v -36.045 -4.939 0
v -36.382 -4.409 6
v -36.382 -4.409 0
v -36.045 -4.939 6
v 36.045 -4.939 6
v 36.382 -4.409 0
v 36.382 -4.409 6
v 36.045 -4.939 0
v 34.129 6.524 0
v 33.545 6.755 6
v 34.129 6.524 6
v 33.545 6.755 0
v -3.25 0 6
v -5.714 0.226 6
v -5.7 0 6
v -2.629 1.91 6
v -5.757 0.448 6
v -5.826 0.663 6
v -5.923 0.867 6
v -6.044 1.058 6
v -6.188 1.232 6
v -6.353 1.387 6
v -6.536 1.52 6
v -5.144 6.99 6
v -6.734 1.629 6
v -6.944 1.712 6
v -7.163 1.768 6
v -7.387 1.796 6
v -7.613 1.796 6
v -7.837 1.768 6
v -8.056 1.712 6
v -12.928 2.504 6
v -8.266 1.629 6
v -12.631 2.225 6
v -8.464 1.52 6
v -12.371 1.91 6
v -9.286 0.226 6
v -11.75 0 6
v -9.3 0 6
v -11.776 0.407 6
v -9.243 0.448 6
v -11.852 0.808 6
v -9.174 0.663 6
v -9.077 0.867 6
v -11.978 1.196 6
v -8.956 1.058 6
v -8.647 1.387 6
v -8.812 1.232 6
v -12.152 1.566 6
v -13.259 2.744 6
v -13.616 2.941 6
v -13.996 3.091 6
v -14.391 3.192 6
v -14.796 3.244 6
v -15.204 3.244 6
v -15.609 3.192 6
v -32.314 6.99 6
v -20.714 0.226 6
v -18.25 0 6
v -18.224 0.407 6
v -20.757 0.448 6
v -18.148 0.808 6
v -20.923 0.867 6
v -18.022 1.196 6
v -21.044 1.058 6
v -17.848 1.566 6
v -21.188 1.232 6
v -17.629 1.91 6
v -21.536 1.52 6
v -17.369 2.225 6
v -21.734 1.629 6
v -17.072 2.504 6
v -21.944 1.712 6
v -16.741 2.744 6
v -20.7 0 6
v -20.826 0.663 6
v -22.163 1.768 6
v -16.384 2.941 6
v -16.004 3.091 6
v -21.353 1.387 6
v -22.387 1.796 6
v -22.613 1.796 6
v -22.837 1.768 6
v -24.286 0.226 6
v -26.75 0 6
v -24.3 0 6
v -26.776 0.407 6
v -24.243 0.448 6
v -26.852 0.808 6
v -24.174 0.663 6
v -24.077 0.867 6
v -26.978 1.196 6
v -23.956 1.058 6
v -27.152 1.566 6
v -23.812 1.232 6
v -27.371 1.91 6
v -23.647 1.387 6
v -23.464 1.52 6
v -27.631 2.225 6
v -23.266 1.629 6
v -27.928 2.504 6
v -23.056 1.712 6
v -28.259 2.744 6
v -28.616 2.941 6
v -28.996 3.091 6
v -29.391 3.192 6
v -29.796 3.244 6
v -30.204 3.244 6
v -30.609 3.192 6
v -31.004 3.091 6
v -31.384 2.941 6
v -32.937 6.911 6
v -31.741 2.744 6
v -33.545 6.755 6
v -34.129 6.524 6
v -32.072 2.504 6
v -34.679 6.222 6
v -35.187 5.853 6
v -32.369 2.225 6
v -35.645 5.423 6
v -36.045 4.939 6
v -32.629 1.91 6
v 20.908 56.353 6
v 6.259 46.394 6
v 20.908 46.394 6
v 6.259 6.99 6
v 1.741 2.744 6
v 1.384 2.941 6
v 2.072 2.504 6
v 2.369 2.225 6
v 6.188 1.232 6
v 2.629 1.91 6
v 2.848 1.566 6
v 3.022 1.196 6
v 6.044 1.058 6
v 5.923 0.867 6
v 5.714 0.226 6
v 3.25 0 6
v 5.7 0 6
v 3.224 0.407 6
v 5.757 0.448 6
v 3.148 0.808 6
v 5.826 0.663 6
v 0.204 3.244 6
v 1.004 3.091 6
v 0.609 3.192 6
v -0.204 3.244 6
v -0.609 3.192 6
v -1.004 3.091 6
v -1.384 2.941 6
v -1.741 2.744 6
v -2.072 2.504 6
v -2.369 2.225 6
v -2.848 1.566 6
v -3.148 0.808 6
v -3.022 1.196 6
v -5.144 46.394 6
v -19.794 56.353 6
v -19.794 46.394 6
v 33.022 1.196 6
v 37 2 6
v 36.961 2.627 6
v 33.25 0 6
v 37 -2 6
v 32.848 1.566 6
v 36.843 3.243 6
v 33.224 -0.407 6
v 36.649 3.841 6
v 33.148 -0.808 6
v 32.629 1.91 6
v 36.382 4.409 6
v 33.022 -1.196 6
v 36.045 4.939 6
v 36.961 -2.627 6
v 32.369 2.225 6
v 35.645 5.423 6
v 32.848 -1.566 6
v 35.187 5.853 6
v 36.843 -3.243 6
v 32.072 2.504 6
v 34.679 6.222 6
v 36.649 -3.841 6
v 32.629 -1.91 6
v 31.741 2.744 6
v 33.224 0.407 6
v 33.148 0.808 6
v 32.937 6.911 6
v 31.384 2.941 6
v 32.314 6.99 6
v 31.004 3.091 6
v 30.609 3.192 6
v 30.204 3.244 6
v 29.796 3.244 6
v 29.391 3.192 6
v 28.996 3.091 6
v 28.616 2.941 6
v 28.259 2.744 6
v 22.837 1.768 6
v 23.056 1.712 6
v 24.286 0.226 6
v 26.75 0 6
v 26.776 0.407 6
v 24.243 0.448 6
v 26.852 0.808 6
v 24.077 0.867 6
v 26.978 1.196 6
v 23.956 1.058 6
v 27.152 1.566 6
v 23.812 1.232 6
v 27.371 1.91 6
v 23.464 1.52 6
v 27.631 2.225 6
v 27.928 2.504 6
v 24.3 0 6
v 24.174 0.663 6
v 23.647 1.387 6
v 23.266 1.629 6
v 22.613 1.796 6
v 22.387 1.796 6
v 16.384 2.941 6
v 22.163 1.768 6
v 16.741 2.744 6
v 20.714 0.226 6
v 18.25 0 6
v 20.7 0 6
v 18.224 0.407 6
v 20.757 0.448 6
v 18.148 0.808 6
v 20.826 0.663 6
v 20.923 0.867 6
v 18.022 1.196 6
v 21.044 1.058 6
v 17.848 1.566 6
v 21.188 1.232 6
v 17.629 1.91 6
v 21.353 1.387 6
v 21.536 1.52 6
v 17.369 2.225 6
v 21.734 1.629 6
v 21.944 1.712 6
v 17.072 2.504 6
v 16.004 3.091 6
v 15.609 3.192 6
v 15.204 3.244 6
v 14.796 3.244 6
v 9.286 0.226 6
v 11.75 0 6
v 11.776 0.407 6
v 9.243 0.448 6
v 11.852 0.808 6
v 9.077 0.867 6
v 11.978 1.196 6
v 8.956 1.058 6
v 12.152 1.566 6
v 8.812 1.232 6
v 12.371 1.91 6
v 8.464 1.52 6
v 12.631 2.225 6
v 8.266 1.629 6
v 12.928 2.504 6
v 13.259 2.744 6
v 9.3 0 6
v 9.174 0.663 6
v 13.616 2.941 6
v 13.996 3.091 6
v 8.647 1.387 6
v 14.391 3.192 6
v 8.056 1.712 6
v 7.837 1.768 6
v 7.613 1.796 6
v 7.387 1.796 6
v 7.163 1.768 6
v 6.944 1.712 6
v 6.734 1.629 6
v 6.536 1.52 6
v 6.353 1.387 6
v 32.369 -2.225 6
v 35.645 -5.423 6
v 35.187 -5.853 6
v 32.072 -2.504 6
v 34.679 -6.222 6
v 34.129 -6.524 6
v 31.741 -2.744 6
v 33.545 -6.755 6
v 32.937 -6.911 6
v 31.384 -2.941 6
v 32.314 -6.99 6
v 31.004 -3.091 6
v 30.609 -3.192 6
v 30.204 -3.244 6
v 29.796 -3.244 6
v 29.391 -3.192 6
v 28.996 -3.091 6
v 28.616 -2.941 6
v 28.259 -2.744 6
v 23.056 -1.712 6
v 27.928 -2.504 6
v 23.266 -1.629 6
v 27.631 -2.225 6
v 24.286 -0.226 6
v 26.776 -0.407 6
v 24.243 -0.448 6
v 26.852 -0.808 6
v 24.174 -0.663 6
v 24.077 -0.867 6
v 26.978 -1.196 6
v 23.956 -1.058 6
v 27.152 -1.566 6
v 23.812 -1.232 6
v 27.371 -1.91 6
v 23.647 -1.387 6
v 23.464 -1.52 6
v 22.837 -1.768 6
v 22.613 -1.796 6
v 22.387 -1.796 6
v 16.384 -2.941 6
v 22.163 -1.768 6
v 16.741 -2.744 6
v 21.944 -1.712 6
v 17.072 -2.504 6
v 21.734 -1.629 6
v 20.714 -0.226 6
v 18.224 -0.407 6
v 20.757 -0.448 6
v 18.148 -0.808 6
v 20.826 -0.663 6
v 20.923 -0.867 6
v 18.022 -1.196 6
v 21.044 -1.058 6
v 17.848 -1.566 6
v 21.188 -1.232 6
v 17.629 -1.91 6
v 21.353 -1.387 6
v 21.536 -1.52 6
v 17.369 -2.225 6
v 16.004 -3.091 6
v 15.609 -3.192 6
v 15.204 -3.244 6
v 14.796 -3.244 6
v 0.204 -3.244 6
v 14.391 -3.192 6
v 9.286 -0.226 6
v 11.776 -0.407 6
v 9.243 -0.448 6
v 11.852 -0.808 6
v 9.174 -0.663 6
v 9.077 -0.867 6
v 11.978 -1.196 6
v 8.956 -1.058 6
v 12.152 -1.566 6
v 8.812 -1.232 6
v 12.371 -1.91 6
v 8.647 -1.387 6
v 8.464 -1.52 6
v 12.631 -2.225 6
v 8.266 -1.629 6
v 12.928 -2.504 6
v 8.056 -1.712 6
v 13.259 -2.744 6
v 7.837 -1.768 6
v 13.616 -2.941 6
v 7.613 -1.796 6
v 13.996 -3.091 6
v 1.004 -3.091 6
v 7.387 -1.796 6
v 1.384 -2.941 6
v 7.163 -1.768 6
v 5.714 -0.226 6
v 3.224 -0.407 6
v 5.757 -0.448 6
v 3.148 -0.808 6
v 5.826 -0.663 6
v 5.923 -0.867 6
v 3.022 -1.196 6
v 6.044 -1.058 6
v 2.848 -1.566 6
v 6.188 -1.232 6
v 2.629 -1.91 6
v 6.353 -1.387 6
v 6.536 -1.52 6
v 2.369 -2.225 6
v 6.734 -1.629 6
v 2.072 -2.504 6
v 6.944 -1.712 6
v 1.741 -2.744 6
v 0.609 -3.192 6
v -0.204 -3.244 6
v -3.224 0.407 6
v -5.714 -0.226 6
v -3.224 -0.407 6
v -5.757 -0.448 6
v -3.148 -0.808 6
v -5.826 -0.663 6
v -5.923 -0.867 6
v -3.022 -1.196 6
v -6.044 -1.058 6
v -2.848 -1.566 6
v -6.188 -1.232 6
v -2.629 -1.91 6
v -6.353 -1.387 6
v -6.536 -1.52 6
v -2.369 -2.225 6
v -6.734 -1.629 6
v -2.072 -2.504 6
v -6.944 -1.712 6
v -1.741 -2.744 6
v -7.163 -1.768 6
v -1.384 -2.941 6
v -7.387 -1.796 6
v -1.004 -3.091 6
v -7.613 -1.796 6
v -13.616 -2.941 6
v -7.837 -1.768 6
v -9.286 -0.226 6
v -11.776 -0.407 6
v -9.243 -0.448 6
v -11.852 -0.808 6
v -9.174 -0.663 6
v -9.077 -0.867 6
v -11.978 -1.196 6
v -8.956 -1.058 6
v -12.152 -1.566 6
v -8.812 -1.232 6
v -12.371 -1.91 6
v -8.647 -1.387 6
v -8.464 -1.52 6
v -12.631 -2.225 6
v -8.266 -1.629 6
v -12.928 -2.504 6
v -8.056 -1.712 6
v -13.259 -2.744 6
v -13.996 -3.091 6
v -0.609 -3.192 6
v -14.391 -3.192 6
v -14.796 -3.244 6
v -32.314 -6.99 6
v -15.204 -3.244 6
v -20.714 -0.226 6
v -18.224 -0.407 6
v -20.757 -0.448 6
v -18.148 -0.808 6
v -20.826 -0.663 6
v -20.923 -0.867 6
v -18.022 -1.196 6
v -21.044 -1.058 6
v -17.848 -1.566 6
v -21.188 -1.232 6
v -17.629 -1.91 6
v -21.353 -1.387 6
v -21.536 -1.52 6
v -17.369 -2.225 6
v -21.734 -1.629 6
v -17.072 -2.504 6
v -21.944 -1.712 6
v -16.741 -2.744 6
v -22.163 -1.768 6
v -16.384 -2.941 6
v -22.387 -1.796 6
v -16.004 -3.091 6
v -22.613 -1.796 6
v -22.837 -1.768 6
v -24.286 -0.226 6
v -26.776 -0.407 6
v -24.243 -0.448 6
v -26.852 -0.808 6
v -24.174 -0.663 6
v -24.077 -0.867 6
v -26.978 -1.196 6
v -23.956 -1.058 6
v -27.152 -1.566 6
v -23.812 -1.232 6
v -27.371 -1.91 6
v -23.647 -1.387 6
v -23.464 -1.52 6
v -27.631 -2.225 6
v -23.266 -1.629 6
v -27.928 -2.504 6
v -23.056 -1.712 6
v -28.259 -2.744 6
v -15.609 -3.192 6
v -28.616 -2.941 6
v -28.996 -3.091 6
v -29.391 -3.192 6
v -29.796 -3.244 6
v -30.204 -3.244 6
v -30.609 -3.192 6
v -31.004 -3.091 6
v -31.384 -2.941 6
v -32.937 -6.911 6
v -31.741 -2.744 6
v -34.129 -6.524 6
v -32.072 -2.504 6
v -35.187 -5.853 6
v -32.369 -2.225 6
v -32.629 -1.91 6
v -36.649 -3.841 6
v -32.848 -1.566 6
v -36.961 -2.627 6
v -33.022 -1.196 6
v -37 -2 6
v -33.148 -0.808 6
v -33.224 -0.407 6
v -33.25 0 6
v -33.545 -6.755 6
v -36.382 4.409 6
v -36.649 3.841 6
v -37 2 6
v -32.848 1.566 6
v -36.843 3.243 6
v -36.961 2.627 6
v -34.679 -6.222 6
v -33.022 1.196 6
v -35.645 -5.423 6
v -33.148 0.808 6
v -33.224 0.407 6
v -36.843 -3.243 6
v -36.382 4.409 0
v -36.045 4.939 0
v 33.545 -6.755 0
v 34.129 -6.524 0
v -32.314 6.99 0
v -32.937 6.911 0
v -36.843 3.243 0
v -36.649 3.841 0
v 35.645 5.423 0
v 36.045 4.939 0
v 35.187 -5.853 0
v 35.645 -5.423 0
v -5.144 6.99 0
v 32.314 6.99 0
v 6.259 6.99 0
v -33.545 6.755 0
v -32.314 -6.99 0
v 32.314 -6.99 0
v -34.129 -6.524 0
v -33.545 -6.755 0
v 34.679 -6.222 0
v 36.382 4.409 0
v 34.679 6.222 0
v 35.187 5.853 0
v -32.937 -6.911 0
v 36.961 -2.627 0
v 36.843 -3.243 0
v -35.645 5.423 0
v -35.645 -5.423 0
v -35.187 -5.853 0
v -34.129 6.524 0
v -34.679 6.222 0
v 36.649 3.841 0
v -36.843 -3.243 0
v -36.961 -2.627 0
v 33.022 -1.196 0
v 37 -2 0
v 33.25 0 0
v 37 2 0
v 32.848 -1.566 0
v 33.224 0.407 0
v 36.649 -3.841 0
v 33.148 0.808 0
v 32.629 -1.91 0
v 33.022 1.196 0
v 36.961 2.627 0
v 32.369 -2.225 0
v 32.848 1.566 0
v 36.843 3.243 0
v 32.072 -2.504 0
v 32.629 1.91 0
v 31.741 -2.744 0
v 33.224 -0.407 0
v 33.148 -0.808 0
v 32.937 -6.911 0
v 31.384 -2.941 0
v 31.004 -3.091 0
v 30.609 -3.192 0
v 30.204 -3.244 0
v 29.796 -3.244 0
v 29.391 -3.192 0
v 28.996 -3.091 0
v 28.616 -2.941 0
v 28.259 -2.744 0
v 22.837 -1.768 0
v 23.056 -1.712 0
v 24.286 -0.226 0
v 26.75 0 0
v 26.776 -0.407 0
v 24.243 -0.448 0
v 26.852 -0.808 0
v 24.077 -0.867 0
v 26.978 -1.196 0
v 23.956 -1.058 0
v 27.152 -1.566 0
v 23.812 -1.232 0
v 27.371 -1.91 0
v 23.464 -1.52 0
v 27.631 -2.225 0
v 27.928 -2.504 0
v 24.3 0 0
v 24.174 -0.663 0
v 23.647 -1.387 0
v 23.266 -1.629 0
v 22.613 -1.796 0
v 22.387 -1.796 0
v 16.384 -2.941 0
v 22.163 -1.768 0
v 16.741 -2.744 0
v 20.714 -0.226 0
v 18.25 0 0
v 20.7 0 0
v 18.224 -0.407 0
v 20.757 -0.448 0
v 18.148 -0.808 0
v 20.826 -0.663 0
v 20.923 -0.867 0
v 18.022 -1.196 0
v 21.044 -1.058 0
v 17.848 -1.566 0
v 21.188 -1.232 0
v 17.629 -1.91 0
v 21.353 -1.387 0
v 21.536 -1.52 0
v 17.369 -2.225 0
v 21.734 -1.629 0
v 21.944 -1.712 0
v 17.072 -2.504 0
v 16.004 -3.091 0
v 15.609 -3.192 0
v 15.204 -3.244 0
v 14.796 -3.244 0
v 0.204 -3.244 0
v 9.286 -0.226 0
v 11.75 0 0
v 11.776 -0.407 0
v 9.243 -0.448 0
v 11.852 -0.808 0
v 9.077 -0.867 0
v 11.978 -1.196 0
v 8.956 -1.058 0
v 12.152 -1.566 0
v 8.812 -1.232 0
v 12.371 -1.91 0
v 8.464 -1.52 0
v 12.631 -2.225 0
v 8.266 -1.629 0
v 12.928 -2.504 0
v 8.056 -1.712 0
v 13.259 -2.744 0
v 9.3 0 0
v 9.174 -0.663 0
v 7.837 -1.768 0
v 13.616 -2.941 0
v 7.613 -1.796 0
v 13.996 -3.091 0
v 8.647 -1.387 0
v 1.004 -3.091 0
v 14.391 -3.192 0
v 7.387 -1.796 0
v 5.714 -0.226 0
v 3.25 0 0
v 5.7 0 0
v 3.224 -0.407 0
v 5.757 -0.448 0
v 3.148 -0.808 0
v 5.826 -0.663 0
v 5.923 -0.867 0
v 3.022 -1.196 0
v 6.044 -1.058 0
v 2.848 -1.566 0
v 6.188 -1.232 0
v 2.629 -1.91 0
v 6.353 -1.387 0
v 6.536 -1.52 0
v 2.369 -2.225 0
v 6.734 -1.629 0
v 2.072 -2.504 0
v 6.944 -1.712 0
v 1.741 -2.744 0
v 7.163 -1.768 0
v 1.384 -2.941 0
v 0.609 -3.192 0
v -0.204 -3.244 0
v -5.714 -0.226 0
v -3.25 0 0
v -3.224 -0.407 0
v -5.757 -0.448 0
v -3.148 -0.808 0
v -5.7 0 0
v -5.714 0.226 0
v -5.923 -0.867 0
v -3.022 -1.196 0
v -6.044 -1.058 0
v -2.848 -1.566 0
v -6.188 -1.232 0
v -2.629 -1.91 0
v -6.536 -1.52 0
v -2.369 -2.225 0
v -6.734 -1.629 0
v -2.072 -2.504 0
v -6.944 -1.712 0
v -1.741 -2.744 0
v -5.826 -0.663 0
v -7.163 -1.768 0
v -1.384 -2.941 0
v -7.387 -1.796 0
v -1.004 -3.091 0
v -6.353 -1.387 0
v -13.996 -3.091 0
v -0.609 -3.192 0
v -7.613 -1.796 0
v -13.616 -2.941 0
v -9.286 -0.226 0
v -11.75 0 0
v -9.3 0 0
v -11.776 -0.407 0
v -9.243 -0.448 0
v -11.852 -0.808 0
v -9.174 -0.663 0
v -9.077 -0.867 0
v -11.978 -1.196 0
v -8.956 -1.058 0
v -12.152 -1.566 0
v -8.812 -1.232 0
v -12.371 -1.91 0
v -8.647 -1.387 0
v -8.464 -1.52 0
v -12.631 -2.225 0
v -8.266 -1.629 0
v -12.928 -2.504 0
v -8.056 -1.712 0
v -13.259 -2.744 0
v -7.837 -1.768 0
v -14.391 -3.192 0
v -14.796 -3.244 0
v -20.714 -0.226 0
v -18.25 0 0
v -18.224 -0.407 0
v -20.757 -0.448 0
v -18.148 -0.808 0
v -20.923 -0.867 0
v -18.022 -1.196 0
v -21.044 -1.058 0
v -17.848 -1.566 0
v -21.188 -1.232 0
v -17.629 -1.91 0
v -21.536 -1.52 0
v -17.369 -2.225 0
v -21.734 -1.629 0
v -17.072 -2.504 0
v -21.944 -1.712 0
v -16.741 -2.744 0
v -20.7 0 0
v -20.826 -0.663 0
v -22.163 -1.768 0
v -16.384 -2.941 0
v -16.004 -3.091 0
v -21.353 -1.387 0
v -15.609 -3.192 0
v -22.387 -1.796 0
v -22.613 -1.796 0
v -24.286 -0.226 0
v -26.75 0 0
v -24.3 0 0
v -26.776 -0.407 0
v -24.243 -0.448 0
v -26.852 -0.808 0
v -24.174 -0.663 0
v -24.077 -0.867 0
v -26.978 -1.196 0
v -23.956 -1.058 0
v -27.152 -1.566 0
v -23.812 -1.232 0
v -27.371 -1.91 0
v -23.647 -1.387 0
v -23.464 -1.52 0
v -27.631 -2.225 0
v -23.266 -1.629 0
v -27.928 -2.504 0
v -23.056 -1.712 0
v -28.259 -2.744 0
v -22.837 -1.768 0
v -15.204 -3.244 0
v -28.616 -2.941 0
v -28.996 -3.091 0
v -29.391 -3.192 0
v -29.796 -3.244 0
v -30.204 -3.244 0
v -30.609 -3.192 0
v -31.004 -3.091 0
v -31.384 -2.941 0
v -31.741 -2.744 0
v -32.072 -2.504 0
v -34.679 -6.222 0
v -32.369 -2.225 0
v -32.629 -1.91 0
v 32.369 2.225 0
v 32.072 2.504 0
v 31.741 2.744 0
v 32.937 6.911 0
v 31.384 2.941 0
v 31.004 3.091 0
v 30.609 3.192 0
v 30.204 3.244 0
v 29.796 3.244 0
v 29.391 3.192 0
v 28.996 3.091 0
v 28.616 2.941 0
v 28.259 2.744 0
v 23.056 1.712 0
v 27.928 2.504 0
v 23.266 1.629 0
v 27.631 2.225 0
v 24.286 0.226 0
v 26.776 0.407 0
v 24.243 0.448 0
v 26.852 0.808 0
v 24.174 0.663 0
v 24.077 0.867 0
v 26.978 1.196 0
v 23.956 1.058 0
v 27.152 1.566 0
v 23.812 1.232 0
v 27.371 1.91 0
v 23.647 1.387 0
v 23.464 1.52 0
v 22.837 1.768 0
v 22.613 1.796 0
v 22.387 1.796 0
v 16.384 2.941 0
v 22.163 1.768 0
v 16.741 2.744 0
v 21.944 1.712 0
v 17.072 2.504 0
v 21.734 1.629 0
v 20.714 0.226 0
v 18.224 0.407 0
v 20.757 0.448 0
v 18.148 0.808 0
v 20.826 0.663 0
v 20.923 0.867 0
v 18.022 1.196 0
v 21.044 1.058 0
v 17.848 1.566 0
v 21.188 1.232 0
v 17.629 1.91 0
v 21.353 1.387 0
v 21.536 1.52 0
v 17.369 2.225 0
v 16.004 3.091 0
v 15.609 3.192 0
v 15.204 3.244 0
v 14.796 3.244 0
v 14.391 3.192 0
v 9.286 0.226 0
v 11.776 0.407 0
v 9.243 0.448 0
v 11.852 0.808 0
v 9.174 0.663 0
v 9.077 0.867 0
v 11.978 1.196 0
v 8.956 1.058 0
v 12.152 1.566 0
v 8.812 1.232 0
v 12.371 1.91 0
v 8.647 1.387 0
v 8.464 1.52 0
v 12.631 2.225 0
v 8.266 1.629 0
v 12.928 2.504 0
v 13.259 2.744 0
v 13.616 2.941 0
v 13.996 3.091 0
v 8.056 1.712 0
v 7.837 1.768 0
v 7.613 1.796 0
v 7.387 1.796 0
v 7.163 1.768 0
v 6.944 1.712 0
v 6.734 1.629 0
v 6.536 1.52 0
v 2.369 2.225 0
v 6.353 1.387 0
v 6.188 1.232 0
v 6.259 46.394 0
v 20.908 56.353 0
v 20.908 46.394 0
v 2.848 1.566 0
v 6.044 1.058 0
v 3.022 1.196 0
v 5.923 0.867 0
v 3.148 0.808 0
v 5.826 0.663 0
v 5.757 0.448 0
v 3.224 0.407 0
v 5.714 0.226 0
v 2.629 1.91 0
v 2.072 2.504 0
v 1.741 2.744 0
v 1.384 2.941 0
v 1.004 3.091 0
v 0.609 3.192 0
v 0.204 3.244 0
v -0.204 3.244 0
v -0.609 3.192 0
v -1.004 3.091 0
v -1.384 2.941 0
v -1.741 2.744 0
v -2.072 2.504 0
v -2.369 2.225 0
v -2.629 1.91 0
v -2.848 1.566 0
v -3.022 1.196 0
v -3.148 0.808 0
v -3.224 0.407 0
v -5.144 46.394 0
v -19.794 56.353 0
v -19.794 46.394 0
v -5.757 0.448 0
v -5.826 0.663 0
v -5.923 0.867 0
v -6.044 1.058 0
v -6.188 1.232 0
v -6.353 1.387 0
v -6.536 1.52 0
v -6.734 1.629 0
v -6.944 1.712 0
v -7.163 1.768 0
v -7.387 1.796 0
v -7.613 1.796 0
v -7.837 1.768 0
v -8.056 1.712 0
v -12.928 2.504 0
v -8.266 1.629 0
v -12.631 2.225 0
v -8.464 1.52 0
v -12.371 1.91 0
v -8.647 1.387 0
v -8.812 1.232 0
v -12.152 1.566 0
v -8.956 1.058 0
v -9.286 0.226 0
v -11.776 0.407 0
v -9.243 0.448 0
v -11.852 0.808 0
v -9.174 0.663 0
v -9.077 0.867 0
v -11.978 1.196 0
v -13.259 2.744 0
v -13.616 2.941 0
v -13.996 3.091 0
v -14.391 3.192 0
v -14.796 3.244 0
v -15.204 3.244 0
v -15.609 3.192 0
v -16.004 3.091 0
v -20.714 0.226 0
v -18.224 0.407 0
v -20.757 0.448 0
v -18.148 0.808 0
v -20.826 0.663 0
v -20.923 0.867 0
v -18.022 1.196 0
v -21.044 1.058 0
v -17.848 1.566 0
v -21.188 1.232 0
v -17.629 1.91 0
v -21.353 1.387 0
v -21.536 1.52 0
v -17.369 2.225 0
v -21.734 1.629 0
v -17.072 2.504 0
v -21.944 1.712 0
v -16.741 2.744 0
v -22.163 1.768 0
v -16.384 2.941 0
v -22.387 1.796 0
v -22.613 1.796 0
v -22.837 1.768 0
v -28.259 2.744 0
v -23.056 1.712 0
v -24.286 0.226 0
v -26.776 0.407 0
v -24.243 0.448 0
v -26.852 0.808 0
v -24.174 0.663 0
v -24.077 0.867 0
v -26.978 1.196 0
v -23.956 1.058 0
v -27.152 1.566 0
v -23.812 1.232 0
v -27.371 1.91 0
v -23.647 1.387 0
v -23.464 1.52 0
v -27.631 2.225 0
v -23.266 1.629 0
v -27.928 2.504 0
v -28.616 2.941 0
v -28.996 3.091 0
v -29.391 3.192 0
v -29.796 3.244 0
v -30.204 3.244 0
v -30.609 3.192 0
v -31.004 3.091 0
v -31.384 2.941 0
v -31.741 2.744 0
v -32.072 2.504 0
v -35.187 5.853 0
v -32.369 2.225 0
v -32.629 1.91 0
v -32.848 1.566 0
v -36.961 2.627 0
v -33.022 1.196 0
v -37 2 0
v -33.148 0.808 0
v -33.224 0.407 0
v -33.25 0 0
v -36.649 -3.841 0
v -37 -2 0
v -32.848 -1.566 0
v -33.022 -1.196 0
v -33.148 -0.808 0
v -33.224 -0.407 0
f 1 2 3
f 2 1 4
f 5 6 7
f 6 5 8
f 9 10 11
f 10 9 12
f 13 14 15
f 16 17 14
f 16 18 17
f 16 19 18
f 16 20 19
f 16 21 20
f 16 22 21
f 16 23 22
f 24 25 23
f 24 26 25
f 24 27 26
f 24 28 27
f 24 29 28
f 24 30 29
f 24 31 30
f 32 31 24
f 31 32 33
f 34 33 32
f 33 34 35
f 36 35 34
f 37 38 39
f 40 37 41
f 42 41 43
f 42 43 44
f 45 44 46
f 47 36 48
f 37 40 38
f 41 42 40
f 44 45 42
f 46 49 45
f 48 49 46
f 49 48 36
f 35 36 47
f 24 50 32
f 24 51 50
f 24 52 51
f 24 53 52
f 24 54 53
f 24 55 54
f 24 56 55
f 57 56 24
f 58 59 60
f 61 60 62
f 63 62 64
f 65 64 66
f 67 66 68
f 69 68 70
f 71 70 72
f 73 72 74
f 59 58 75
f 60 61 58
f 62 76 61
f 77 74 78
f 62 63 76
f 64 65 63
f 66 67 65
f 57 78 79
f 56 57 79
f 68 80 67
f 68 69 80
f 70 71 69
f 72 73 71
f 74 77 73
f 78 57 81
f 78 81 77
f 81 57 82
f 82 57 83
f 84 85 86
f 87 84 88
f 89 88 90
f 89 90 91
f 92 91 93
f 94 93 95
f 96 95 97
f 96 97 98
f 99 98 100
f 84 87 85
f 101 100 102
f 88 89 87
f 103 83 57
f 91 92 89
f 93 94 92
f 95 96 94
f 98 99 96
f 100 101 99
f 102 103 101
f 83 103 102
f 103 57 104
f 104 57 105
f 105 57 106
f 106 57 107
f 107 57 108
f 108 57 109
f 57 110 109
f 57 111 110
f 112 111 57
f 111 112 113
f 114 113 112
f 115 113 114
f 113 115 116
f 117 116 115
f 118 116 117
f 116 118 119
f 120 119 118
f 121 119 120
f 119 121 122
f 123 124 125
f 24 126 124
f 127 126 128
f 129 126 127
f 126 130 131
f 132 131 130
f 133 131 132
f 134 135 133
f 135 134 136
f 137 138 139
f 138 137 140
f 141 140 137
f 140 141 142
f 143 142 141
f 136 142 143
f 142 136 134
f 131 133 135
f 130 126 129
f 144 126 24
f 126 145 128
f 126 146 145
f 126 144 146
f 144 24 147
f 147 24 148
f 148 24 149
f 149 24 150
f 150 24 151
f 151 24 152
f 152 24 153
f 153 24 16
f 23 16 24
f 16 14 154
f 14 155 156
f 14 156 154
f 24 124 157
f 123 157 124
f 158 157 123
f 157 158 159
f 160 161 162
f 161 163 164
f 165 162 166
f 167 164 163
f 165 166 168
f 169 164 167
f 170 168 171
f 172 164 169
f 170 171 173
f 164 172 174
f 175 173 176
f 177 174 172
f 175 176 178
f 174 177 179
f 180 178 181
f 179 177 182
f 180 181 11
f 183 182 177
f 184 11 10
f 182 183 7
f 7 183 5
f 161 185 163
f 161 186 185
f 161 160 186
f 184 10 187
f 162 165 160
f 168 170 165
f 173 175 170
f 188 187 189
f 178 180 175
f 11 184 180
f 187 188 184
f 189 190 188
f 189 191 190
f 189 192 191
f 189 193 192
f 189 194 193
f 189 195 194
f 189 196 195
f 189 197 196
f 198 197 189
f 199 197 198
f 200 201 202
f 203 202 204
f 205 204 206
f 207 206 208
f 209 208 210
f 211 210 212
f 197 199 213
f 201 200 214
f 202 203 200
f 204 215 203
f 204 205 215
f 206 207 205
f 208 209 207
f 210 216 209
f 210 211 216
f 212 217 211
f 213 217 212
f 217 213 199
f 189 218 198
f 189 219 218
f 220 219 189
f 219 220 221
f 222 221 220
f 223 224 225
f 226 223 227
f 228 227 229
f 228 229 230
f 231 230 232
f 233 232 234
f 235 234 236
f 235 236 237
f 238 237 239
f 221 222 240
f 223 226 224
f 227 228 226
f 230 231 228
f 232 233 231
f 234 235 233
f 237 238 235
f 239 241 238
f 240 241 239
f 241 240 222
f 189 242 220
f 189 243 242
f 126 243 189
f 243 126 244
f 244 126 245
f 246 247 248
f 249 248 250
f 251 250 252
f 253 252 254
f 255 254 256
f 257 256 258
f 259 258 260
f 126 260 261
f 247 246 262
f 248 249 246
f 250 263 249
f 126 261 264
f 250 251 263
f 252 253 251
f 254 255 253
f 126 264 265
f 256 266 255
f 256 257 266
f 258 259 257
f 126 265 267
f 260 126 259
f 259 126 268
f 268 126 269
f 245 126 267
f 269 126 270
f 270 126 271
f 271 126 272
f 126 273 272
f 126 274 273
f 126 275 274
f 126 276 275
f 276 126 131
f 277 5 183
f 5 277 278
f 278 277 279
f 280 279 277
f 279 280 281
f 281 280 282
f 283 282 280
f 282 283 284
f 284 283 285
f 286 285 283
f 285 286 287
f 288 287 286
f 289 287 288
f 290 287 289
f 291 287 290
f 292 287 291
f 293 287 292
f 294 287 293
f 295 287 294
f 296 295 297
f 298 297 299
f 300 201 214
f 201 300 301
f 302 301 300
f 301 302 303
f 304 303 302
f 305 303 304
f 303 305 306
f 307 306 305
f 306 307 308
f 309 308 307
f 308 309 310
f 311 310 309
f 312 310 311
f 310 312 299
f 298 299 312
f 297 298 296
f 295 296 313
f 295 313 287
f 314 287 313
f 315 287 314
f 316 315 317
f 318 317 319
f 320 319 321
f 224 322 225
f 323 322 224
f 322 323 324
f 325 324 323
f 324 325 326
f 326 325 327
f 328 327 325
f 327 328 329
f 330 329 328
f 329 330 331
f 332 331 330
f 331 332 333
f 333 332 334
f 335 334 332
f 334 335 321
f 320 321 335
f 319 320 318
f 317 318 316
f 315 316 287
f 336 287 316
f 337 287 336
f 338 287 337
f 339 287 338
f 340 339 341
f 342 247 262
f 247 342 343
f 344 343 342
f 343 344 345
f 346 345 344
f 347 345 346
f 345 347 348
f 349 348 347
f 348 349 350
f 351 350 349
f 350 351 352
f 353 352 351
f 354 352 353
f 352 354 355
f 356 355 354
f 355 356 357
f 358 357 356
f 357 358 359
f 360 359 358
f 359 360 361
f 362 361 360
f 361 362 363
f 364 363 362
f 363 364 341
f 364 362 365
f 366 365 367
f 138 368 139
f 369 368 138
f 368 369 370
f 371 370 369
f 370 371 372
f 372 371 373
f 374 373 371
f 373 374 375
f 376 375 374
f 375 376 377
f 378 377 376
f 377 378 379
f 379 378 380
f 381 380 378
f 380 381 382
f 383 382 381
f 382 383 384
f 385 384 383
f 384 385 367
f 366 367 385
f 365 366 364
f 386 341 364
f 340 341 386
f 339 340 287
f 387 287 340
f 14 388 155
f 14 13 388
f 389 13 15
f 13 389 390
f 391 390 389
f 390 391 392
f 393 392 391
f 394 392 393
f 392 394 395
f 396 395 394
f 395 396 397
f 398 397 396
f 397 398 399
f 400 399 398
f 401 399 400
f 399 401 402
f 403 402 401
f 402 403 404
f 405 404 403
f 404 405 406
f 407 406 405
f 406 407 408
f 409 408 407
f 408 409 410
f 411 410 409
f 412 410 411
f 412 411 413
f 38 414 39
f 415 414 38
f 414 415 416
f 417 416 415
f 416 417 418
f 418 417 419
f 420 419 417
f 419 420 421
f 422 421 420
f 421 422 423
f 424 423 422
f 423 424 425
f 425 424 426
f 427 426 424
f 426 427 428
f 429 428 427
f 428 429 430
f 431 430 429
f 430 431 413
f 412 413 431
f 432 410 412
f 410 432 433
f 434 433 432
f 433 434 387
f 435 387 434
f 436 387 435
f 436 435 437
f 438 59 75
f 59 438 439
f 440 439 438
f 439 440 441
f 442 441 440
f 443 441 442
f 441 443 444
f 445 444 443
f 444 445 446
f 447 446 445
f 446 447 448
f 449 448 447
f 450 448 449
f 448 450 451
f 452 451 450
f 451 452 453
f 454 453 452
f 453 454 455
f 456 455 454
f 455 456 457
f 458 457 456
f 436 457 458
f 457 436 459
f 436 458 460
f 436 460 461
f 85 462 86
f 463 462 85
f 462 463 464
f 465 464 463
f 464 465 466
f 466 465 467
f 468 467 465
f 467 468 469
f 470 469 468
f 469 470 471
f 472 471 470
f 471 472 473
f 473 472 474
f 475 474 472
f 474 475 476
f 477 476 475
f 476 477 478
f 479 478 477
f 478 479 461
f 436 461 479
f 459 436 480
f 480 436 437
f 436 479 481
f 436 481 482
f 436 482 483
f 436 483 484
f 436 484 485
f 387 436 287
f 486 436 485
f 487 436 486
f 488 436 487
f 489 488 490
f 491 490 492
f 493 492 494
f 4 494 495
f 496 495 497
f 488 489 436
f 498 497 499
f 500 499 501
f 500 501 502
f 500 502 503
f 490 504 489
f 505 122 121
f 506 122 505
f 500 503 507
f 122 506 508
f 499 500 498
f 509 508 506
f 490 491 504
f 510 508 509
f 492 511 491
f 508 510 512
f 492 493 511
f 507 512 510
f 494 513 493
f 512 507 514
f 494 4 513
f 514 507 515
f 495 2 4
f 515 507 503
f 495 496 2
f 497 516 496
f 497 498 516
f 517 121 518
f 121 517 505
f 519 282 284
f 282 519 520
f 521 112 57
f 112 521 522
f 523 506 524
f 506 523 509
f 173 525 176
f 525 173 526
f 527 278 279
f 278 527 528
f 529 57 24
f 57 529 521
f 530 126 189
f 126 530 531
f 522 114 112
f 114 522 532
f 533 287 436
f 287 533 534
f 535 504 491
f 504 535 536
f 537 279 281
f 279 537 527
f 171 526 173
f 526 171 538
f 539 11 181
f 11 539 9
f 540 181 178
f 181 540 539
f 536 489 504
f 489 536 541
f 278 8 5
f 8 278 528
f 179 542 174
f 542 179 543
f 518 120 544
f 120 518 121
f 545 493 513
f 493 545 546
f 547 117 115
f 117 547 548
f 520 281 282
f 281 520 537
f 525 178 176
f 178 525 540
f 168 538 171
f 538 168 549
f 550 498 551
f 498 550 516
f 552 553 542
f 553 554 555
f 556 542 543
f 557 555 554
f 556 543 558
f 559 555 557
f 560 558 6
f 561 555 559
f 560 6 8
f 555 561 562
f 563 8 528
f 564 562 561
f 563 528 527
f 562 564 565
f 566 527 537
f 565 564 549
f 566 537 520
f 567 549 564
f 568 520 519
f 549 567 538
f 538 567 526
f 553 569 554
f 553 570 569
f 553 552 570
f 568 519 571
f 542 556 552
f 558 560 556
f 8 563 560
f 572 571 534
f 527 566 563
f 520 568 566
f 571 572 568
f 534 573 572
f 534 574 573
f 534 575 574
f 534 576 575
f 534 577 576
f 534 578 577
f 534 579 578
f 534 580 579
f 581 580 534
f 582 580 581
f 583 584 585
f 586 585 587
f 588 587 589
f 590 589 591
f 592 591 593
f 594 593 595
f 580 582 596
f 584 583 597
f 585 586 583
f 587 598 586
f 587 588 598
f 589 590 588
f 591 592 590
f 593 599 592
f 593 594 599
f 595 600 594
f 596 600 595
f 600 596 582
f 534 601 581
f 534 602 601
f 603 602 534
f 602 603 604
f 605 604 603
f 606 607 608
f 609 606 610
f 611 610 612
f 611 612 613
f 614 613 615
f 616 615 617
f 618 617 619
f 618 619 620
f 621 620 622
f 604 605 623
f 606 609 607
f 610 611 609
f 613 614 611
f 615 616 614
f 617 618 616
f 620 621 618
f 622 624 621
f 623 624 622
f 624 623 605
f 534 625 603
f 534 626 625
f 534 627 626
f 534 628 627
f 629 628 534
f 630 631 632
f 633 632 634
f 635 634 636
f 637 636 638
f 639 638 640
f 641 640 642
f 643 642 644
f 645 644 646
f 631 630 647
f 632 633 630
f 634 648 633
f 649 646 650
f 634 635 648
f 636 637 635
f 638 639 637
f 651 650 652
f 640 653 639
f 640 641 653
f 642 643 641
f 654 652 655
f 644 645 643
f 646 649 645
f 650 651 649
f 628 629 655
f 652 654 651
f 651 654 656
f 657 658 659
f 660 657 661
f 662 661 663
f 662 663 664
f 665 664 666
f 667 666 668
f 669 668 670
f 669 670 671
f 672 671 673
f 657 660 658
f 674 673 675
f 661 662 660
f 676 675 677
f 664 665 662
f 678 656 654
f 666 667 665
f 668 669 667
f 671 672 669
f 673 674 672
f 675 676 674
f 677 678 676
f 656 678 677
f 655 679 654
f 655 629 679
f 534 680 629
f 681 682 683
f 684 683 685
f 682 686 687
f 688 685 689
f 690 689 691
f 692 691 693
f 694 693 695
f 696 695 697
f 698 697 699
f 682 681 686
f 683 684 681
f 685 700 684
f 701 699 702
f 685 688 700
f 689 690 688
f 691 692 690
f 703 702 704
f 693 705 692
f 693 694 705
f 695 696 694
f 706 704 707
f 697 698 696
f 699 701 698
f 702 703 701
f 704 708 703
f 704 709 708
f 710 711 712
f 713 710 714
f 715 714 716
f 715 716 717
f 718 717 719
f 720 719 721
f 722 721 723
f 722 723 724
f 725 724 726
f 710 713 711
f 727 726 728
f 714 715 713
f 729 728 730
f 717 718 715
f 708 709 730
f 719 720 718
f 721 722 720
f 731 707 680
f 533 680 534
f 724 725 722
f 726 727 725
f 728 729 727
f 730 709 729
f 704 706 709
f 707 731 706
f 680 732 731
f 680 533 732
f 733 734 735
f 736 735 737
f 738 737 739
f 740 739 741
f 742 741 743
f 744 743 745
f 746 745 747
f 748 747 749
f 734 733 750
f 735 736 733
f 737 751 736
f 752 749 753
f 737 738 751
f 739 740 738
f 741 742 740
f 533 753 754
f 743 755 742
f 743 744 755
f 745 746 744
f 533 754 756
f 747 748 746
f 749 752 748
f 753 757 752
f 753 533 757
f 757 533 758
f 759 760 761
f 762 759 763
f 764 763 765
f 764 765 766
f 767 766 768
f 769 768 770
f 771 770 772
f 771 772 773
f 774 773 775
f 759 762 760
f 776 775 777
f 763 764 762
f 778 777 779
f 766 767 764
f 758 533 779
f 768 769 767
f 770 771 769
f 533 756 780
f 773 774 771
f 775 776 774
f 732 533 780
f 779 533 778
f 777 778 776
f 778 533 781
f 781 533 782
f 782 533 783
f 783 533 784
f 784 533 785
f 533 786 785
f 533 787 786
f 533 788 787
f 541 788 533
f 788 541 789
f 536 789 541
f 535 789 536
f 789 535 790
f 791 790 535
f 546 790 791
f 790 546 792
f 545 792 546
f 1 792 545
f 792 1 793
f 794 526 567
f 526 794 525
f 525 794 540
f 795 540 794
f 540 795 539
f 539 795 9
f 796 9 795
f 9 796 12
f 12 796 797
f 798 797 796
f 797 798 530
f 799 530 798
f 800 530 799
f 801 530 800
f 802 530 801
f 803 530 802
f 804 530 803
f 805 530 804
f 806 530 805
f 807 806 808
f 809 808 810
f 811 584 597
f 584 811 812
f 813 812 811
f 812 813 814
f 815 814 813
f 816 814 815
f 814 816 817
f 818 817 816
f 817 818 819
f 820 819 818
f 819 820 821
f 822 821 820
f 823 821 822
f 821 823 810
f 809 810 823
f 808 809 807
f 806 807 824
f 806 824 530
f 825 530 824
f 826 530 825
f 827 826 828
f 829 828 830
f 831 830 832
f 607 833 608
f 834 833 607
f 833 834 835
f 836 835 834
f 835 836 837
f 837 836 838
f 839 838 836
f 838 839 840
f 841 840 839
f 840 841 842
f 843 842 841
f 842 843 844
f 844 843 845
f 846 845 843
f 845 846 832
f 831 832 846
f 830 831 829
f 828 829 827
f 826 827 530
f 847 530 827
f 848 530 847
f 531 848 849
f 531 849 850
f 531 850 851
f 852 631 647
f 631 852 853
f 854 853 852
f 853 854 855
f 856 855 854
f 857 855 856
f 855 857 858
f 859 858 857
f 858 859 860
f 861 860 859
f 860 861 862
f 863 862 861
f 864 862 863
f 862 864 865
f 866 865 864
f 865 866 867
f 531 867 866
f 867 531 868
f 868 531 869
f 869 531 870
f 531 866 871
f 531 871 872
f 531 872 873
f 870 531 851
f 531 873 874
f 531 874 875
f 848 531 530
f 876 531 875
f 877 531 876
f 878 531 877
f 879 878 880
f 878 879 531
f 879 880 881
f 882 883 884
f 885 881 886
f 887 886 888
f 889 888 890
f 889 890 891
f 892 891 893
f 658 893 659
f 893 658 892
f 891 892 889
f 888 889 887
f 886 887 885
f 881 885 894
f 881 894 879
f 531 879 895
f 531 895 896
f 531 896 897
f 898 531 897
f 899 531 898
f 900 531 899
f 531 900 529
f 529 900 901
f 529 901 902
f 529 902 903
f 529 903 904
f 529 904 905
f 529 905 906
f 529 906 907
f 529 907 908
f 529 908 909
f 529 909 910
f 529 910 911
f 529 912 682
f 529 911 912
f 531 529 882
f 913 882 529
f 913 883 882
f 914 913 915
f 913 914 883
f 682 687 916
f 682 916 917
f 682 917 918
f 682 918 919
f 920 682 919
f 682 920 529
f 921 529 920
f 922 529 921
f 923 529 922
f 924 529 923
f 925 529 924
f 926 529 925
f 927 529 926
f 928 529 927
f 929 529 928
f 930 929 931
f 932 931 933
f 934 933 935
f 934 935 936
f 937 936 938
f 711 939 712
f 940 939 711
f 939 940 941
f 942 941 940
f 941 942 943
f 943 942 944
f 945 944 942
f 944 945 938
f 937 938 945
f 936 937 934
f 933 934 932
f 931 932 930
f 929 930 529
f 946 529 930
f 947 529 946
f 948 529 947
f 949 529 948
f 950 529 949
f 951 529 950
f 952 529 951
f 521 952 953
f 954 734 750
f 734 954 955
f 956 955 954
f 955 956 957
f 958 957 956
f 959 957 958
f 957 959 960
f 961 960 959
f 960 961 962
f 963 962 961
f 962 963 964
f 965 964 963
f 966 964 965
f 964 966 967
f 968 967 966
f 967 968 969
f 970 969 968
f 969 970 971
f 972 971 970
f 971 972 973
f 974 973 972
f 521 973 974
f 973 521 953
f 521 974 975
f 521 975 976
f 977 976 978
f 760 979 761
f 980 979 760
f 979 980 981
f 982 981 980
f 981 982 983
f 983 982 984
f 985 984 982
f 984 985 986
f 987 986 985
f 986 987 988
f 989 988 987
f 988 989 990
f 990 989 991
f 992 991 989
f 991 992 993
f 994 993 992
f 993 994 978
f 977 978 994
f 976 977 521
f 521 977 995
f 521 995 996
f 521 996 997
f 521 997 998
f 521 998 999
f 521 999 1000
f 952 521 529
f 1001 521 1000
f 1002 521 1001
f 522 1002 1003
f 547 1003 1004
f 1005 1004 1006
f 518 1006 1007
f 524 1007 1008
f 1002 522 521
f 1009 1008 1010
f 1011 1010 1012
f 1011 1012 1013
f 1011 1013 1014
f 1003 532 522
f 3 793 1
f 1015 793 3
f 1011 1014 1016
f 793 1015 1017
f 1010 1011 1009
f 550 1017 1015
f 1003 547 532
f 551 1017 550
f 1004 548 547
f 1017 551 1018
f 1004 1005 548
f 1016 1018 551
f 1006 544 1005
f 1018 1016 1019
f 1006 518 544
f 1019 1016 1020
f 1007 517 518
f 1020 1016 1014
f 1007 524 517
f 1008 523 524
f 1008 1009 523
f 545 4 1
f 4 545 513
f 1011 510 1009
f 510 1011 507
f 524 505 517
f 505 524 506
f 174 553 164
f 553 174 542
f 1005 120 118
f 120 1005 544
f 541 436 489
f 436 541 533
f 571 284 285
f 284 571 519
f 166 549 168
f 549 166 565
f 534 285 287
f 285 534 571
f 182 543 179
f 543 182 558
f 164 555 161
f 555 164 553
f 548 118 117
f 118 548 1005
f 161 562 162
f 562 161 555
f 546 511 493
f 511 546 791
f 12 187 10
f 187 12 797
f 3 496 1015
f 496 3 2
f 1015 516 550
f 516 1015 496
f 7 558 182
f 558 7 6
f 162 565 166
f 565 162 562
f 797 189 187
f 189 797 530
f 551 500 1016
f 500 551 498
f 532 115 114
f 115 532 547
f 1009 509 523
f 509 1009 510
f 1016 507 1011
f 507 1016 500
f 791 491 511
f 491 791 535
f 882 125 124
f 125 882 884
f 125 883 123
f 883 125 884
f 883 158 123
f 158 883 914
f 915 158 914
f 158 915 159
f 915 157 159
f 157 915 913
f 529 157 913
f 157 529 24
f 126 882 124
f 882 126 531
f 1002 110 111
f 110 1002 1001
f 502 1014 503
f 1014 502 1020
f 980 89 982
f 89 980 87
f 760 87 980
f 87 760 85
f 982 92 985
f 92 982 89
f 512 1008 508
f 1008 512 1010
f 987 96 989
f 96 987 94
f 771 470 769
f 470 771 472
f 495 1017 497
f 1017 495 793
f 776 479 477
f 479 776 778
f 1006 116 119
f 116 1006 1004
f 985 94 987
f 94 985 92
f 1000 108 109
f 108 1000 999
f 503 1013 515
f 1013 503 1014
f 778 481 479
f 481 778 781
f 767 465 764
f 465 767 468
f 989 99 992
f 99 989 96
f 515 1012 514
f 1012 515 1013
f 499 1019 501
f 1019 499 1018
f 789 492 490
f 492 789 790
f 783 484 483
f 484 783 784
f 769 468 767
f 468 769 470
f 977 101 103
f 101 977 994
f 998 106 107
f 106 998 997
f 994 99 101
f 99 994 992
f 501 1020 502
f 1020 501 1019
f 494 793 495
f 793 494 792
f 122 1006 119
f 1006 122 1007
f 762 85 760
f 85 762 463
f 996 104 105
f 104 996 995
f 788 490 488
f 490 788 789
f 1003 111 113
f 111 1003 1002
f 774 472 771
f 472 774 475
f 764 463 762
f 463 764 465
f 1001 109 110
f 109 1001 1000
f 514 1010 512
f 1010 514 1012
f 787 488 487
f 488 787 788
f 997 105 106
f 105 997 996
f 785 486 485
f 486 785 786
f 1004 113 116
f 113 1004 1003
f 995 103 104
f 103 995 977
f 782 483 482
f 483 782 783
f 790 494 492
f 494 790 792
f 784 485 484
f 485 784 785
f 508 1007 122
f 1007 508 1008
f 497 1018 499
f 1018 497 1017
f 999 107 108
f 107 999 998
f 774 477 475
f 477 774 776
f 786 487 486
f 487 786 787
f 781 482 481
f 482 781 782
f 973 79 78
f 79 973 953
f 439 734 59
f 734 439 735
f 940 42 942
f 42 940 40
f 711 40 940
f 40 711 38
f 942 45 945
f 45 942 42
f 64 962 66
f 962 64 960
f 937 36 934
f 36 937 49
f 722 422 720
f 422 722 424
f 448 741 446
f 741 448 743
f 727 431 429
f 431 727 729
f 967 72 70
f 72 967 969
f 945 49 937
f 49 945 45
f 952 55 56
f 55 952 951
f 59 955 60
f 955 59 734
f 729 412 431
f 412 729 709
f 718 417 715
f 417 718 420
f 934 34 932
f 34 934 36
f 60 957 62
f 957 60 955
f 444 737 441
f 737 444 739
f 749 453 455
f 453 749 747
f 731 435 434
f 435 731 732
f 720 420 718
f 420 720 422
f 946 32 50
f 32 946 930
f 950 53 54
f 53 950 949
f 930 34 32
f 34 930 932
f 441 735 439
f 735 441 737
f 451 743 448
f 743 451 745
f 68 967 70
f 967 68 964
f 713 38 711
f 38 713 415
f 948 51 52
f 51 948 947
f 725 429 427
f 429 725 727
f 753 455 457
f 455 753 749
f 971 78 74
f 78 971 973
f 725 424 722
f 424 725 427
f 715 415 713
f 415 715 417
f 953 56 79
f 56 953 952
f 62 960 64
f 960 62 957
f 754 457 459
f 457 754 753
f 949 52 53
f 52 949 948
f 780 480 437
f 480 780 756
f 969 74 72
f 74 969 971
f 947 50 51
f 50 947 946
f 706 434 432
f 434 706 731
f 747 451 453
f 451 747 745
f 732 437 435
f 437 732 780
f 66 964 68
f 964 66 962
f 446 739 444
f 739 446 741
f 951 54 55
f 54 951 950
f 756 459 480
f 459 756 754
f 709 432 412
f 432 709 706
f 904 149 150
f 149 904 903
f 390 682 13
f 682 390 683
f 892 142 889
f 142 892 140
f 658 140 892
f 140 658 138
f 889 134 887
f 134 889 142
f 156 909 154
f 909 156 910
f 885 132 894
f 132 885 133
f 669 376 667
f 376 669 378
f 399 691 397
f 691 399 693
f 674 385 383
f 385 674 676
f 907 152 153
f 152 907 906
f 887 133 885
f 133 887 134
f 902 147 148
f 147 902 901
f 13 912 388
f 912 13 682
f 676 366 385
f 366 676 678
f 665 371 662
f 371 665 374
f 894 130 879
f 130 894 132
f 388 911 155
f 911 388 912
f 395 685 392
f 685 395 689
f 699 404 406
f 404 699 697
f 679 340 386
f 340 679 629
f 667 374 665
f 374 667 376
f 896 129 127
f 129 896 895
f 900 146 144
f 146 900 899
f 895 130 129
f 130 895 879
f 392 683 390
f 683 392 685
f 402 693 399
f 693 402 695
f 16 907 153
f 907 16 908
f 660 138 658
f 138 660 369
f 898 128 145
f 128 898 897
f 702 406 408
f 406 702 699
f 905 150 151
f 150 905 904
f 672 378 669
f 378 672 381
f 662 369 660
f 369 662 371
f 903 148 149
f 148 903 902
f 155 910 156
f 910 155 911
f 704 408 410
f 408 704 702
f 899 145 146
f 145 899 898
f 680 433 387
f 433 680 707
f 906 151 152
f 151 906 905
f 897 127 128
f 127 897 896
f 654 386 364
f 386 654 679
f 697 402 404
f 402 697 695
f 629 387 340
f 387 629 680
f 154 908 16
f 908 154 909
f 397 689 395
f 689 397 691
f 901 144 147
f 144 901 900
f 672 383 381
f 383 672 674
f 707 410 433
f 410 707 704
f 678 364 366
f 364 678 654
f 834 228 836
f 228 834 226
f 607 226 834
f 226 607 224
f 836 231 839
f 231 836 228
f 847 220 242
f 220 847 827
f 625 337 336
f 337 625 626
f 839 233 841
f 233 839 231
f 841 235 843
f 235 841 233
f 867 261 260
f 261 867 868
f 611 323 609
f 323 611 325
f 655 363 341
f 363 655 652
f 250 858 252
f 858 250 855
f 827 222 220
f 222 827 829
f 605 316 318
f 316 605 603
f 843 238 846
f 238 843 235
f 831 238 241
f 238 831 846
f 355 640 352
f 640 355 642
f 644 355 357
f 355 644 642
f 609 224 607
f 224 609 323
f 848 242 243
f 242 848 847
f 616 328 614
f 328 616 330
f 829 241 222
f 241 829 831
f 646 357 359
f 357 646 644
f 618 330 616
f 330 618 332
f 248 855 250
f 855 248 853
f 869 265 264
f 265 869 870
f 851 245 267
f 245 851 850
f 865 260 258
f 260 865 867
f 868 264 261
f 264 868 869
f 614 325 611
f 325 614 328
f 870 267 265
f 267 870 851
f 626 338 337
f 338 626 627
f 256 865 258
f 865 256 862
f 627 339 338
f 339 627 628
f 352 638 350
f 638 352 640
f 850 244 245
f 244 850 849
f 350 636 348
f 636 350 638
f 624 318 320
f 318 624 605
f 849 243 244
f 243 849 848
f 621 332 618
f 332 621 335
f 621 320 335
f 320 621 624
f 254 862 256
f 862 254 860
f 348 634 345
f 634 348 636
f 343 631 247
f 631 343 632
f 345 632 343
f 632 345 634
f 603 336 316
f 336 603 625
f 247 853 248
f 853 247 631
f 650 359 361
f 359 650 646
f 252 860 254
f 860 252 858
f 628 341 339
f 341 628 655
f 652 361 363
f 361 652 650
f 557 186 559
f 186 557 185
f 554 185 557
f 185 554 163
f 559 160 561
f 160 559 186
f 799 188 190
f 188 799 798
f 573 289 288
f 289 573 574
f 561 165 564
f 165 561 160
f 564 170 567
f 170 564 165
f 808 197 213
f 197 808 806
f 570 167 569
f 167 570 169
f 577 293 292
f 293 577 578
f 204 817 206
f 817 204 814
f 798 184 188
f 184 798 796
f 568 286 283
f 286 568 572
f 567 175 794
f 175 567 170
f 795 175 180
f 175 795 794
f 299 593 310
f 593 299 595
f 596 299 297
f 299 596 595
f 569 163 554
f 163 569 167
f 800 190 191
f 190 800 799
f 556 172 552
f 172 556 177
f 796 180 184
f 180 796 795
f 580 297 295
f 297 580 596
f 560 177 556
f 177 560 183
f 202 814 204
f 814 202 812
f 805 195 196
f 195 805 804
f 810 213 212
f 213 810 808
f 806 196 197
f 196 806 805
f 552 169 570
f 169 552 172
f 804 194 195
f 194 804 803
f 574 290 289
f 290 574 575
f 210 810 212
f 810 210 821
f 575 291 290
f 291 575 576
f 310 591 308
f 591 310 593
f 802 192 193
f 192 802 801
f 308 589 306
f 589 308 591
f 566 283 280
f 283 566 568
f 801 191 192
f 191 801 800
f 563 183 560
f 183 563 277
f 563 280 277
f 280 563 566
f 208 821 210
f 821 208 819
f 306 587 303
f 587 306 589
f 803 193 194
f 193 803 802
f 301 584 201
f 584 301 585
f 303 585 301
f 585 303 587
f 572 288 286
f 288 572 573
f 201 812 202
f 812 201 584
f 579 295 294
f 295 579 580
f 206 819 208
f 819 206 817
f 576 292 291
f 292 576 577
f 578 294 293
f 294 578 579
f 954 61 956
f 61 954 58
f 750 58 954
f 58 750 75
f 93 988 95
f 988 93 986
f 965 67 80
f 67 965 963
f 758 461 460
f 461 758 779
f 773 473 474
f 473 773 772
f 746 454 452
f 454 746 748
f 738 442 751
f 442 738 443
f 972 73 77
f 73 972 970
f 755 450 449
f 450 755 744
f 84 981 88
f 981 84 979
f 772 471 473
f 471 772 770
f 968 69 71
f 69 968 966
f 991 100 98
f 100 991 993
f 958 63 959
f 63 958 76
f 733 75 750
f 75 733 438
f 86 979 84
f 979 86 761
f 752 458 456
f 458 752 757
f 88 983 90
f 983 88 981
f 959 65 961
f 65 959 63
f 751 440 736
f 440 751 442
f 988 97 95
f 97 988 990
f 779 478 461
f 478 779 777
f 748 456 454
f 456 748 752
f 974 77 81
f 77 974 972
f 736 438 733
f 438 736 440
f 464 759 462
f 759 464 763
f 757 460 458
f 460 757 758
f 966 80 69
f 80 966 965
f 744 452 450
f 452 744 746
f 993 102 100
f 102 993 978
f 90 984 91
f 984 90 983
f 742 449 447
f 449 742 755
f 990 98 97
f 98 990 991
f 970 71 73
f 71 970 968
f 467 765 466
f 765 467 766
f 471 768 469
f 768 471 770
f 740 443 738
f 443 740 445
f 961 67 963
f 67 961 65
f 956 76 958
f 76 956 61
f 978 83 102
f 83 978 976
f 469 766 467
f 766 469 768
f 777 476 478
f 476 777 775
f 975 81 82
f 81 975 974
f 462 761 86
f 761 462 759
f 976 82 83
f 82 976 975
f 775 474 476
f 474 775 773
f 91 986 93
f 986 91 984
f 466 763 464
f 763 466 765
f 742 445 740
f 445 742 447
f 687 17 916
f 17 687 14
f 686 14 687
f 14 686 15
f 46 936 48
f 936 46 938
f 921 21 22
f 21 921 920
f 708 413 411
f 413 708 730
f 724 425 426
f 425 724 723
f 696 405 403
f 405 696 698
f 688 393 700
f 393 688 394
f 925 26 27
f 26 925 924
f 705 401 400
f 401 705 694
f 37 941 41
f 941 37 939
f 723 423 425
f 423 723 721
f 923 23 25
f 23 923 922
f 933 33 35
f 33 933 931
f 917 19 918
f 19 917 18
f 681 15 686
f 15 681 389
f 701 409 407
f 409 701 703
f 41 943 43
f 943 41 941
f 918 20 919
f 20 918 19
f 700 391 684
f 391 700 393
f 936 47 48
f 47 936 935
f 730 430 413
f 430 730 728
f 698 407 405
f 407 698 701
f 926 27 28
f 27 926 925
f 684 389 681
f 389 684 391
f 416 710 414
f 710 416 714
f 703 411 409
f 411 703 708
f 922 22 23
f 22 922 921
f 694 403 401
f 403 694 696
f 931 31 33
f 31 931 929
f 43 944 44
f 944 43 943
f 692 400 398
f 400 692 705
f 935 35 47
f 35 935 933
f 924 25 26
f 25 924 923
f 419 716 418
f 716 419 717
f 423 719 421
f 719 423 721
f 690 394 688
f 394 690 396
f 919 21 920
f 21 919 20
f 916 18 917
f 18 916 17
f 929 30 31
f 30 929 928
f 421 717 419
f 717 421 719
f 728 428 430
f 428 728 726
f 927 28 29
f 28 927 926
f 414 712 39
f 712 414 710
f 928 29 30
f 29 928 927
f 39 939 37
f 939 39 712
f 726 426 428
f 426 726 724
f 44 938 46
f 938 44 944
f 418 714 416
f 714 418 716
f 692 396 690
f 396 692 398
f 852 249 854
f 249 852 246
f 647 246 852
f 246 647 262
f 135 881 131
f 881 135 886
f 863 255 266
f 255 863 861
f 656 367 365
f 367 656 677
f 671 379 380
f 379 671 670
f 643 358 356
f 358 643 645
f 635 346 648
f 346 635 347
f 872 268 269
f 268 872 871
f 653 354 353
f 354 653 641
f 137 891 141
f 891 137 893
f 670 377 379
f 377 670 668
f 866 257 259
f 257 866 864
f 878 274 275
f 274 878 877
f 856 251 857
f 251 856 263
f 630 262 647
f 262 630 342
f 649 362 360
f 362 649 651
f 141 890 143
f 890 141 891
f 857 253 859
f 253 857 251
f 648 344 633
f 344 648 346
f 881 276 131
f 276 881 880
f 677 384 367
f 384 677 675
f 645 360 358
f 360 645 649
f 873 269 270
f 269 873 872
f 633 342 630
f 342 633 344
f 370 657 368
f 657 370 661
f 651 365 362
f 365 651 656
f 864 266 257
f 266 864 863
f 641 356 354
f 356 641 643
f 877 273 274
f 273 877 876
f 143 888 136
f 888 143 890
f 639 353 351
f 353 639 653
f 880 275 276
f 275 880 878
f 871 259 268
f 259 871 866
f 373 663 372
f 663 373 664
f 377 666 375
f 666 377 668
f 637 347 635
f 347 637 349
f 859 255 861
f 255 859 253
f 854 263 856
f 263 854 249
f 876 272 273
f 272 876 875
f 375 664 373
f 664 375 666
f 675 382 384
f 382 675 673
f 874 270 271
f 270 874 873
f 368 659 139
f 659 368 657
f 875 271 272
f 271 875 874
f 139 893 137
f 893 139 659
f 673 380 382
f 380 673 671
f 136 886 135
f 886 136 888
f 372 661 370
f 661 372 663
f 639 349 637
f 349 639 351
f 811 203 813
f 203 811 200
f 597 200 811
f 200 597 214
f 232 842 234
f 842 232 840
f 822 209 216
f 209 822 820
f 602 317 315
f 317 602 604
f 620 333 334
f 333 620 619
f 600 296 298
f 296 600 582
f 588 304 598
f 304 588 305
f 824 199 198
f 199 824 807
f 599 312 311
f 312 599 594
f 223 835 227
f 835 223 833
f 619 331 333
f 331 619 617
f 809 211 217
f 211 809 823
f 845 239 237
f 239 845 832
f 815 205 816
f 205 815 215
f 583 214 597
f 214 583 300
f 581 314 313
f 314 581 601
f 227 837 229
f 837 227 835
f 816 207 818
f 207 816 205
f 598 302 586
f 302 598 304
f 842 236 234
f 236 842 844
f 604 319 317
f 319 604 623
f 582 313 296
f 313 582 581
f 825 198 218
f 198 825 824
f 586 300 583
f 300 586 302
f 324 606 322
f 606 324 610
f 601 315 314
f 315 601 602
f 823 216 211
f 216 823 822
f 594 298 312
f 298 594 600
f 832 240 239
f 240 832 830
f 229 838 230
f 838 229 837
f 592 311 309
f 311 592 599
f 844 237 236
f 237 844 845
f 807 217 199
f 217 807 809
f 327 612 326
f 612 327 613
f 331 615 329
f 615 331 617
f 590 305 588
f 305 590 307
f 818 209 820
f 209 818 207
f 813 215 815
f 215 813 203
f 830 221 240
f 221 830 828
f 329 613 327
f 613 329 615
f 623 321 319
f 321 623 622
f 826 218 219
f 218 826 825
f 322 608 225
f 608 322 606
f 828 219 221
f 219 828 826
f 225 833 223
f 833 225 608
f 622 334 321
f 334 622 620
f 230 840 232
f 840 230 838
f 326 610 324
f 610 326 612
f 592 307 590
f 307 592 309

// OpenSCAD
$fn = 50;


difference() {
	union() {
		hull() {
			translate(v = [-32.0000000000, 2.0000000000, 0]) {
				cylinder(h = 6, r = 5);
			}
			translate(v = [32.0000000000, 2.0000000000, 0]) {
				cylinder(h = 6, r = 5);
			}
			translate(v = [-32.0000000000, -2.0000000000, 0]) {
				cylinder(h = 6, r = 5);
			}
			translate(v = [32.0000000000, -2.0000000000, 0]) {
				cylinder(h = 6, r = 5);
			}
		}
		translate(v = [0, 55, 0]) {
			linear_extrude(height = 6) {
				text(font = "DejaVu Sans Mono:style=Bold", halign = "center", size = 57.0000000000, text = "T", valign = "top");
			}
		}
	}
	union() {
		translate(v = [-30.0000000000, 0.0000000000, 0]) {
			translate(v = [0, 0, -100]) {
				cylinder(h = 200, r = 3.2500000000);
			}
		}
		translate(v = [-15.0000000000, 0.0000000000, 0]) {
			translate(v = [0, 0, -100]) {
				cylinder(h = 200, r = 3.2500000000);
			}
		}
		translate(v = [0, 0, -100]) {
			cylinder(h = 200, r = 3.2500000000);
		}
		translate(v = [15.0000000000, 0.0000000000, 0]) {
			translate(v = [0, 0, -100]) {
				cylinder(h = 200, r = 3.2500000000);
			}
		}
		translate(v = [30.0000000000, 0.0000000000, 0]) {
			translate(v = [0, 0, -100]) {
				cylinder(h = 200, r = 3.2500000000);
			}
		}
		translate(v = [-30.0000000000, 0.0000000000, 0]) {
			translate(v = [0, 0, -100]) {
				cylinder(h = 200, r = 1.8000000000);
			}
		}
		translate(v = [-22.5000000000, 0.0000000000, 0]) {
			translate(v = [0, 0, -100]) {
				cylinder(h = 200, r = 1.8000000000);
			}
		}
		translate(v = [-15.0000000000, 0.0000000000, 0]) {
			translate(v = [0, 0, -100]) {
				cylinder(h = 200, r = 1.8000000000);
			}
		}
		translate(v = [-7.5000000000, 0.0000000000, 0]) {
			translate(v = [0, 0, -100]) {
				cylinder(h = 200, r = 1.8000000000);
			}
		}
		translate(v = [0, 0, -100]) {
			cylinder(h = 200, r = 1.8000000000);
		}
		translate(v = [7.5000000000, 0.0000000000, 0]) {
			translate(v = [0, 0, -100]) {
				cylinder(h = 200, r = 1.8000000000);
			}
		}
		translate(v = [15.0000000000, 0.0000000000, 0]) {
			translate(v = [0, 0, -100]) {
				cylinder(h = 200, r = 1.8000000000);
			}
		}
		translate(v = [22.5000000000, 0.0000000000, 0]) {
			translate(v = [0, 0, -100]) {
				cylinder(h = 200, r = 1.8000000000);
			}
		}
		translate(v = [30.0000000000, 0.0000000000, 0]) {
			translate(v = [0, 0, -100]) {
				cylinder(h = 200, r = 1.8000000000);
			}
		}
	}
}
